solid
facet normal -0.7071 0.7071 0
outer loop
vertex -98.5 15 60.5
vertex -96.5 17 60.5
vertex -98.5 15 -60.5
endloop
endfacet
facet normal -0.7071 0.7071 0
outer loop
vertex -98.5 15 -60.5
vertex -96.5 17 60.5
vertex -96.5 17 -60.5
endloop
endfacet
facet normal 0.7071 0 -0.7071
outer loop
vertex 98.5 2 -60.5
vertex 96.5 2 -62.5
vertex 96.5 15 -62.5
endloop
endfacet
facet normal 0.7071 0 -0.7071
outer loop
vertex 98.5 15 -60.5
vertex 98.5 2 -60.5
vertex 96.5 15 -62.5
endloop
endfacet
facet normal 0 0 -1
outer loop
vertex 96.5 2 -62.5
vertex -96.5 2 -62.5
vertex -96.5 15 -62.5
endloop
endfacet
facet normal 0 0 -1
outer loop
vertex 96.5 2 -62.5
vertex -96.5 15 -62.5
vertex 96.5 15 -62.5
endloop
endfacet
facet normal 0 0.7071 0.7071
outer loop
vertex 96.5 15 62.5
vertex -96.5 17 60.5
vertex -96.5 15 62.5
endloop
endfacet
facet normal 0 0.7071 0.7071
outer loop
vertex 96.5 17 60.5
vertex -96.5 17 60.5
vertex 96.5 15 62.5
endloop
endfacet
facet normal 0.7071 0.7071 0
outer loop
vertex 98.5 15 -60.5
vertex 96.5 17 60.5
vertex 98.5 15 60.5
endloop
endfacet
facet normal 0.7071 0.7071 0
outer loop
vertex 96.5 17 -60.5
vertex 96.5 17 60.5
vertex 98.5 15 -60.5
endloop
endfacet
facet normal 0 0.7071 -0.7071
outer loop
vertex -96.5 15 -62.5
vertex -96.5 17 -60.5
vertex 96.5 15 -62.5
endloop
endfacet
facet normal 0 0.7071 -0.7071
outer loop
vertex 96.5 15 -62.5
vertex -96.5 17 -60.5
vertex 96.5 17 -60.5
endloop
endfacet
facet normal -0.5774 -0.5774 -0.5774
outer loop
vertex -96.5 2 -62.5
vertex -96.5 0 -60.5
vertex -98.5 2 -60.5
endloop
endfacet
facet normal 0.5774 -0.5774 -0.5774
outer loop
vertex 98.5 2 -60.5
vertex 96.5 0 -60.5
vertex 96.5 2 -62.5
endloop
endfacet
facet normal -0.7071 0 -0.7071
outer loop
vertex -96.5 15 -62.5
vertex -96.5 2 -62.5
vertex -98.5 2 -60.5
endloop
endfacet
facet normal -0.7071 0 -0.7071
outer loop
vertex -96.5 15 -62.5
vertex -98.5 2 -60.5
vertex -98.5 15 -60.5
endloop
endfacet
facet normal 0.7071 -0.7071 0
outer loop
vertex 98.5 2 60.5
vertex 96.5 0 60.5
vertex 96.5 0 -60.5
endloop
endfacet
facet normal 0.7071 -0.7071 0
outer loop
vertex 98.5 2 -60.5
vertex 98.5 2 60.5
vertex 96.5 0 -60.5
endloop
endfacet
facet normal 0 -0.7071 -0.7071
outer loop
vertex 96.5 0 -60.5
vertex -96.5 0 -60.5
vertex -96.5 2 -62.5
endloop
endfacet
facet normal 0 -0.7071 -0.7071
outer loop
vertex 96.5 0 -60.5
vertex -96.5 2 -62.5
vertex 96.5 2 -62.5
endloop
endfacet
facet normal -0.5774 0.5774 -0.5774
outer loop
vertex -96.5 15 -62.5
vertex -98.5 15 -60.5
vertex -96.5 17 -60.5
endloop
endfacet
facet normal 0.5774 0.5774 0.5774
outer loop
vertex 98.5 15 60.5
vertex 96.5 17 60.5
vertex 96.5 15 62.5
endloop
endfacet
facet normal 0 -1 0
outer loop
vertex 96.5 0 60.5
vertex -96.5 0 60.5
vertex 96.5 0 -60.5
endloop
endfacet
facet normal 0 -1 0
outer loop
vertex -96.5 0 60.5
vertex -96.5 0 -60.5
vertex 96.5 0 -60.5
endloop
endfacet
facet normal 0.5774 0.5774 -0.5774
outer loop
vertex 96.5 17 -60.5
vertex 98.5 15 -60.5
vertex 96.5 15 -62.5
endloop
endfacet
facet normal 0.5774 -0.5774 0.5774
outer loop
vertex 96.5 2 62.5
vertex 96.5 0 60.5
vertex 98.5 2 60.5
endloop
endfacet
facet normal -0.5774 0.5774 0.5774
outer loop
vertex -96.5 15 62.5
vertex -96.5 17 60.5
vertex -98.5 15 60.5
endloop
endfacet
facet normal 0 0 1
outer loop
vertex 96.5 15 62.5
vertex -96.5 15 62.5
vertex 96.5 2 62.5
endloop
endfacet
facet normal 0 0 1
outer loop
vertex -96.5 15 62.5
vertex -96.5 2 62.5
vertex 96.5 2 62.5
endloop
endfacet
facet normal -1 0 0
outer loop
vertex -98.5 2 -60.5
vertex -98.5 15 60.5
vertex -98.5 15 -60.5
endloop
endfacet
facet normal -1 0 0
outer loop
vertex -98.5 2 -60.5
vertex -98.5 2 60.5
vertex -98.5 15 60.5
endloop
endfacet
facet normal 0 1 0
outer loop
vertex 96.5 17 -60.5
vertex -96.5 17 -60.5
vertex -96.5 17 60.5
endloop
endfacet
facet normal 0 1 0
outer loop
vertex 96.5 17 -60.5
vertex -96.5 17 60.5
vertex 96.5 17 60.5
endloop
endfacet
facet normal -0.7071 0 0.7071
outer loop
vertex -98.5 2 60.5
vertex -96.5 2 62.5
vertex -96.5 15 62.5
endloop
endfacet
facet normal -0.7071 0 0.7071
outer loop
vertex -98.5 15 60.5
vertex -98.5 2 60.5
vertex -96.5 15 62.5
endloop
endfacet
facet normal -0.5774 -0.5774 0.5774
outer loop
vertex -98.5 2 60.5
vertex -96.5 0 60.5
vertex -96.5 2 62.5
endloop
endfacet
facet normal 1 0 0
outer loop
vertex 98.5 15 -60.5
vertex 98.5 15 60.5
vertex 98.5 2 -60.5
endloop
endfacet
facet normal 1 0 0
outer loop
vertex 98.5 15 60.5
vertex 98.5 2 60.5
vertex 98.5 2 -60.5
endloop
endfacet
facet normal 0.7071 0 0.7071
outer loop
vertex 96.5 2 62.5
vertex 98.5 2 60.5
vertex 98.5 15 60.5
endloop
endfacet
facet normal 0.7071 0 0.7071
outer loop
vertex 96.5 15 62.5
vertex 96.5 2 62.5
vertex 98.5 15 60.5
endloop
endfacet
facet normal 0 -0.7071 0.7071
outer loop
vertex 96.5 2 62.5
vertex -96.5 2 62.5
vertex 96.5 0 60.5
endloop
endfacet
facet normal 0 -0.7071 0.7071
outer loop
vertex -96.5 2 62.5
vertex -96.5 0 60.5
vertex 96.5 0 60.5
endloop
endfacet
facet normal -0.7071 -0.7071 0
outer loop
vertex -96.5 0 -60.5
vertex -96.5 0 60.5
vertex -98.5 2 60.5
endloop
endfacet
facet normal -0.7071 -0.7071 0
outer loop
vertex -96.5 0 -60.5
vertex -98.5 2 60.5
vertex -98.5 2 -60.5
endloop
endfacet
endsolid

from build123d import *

# Parameters (mm, degrees)
SCHIZZO1_W                   = 197
SCHIZZO1_H                   = 125
ESTRUSIONE_ESTRUSIONE1_DEPTH = 17
SMUSSO1_SIZE                 = 2


with BuildPart() as part:
    # Schizzo1 → Estrusione-Estrusione1 (new body)
    with BuildSketch(Plane(origin=(0, 0, 0), x_dir=(1, 0, 0), z_dir=(0, 1, 0))):
        Rectangle(SCHIZZO1_W, SCHIZZO1_H)
    extrude(amount=ESTRUSIONE_ESTRUSIONE1_DEPTH)

    # Smusso1
    smusso1_edges = [part.edges().sort_by_distance(p)[0] for p in [
        (-98.5, 17, 0),
        (0, 17, 62.5),
        (98.5, 17, 0),
        (0, 0, 62.5),
        (-98.5, 0, 0),
        (0, 0, -62.5),
        (98.5, 0, 0),
        (98.5, 8.5, 62.5),
        (-98.5, 8.5, 62.5),
        (-98.5, 8.5, -62.5),
        (98.5, 8.5, -62.5),
        (0, 17, -62.5),
    ]]
    chamfer(smusso1_edges, length=SMUSSO1_SIZE)


solid = part.part
